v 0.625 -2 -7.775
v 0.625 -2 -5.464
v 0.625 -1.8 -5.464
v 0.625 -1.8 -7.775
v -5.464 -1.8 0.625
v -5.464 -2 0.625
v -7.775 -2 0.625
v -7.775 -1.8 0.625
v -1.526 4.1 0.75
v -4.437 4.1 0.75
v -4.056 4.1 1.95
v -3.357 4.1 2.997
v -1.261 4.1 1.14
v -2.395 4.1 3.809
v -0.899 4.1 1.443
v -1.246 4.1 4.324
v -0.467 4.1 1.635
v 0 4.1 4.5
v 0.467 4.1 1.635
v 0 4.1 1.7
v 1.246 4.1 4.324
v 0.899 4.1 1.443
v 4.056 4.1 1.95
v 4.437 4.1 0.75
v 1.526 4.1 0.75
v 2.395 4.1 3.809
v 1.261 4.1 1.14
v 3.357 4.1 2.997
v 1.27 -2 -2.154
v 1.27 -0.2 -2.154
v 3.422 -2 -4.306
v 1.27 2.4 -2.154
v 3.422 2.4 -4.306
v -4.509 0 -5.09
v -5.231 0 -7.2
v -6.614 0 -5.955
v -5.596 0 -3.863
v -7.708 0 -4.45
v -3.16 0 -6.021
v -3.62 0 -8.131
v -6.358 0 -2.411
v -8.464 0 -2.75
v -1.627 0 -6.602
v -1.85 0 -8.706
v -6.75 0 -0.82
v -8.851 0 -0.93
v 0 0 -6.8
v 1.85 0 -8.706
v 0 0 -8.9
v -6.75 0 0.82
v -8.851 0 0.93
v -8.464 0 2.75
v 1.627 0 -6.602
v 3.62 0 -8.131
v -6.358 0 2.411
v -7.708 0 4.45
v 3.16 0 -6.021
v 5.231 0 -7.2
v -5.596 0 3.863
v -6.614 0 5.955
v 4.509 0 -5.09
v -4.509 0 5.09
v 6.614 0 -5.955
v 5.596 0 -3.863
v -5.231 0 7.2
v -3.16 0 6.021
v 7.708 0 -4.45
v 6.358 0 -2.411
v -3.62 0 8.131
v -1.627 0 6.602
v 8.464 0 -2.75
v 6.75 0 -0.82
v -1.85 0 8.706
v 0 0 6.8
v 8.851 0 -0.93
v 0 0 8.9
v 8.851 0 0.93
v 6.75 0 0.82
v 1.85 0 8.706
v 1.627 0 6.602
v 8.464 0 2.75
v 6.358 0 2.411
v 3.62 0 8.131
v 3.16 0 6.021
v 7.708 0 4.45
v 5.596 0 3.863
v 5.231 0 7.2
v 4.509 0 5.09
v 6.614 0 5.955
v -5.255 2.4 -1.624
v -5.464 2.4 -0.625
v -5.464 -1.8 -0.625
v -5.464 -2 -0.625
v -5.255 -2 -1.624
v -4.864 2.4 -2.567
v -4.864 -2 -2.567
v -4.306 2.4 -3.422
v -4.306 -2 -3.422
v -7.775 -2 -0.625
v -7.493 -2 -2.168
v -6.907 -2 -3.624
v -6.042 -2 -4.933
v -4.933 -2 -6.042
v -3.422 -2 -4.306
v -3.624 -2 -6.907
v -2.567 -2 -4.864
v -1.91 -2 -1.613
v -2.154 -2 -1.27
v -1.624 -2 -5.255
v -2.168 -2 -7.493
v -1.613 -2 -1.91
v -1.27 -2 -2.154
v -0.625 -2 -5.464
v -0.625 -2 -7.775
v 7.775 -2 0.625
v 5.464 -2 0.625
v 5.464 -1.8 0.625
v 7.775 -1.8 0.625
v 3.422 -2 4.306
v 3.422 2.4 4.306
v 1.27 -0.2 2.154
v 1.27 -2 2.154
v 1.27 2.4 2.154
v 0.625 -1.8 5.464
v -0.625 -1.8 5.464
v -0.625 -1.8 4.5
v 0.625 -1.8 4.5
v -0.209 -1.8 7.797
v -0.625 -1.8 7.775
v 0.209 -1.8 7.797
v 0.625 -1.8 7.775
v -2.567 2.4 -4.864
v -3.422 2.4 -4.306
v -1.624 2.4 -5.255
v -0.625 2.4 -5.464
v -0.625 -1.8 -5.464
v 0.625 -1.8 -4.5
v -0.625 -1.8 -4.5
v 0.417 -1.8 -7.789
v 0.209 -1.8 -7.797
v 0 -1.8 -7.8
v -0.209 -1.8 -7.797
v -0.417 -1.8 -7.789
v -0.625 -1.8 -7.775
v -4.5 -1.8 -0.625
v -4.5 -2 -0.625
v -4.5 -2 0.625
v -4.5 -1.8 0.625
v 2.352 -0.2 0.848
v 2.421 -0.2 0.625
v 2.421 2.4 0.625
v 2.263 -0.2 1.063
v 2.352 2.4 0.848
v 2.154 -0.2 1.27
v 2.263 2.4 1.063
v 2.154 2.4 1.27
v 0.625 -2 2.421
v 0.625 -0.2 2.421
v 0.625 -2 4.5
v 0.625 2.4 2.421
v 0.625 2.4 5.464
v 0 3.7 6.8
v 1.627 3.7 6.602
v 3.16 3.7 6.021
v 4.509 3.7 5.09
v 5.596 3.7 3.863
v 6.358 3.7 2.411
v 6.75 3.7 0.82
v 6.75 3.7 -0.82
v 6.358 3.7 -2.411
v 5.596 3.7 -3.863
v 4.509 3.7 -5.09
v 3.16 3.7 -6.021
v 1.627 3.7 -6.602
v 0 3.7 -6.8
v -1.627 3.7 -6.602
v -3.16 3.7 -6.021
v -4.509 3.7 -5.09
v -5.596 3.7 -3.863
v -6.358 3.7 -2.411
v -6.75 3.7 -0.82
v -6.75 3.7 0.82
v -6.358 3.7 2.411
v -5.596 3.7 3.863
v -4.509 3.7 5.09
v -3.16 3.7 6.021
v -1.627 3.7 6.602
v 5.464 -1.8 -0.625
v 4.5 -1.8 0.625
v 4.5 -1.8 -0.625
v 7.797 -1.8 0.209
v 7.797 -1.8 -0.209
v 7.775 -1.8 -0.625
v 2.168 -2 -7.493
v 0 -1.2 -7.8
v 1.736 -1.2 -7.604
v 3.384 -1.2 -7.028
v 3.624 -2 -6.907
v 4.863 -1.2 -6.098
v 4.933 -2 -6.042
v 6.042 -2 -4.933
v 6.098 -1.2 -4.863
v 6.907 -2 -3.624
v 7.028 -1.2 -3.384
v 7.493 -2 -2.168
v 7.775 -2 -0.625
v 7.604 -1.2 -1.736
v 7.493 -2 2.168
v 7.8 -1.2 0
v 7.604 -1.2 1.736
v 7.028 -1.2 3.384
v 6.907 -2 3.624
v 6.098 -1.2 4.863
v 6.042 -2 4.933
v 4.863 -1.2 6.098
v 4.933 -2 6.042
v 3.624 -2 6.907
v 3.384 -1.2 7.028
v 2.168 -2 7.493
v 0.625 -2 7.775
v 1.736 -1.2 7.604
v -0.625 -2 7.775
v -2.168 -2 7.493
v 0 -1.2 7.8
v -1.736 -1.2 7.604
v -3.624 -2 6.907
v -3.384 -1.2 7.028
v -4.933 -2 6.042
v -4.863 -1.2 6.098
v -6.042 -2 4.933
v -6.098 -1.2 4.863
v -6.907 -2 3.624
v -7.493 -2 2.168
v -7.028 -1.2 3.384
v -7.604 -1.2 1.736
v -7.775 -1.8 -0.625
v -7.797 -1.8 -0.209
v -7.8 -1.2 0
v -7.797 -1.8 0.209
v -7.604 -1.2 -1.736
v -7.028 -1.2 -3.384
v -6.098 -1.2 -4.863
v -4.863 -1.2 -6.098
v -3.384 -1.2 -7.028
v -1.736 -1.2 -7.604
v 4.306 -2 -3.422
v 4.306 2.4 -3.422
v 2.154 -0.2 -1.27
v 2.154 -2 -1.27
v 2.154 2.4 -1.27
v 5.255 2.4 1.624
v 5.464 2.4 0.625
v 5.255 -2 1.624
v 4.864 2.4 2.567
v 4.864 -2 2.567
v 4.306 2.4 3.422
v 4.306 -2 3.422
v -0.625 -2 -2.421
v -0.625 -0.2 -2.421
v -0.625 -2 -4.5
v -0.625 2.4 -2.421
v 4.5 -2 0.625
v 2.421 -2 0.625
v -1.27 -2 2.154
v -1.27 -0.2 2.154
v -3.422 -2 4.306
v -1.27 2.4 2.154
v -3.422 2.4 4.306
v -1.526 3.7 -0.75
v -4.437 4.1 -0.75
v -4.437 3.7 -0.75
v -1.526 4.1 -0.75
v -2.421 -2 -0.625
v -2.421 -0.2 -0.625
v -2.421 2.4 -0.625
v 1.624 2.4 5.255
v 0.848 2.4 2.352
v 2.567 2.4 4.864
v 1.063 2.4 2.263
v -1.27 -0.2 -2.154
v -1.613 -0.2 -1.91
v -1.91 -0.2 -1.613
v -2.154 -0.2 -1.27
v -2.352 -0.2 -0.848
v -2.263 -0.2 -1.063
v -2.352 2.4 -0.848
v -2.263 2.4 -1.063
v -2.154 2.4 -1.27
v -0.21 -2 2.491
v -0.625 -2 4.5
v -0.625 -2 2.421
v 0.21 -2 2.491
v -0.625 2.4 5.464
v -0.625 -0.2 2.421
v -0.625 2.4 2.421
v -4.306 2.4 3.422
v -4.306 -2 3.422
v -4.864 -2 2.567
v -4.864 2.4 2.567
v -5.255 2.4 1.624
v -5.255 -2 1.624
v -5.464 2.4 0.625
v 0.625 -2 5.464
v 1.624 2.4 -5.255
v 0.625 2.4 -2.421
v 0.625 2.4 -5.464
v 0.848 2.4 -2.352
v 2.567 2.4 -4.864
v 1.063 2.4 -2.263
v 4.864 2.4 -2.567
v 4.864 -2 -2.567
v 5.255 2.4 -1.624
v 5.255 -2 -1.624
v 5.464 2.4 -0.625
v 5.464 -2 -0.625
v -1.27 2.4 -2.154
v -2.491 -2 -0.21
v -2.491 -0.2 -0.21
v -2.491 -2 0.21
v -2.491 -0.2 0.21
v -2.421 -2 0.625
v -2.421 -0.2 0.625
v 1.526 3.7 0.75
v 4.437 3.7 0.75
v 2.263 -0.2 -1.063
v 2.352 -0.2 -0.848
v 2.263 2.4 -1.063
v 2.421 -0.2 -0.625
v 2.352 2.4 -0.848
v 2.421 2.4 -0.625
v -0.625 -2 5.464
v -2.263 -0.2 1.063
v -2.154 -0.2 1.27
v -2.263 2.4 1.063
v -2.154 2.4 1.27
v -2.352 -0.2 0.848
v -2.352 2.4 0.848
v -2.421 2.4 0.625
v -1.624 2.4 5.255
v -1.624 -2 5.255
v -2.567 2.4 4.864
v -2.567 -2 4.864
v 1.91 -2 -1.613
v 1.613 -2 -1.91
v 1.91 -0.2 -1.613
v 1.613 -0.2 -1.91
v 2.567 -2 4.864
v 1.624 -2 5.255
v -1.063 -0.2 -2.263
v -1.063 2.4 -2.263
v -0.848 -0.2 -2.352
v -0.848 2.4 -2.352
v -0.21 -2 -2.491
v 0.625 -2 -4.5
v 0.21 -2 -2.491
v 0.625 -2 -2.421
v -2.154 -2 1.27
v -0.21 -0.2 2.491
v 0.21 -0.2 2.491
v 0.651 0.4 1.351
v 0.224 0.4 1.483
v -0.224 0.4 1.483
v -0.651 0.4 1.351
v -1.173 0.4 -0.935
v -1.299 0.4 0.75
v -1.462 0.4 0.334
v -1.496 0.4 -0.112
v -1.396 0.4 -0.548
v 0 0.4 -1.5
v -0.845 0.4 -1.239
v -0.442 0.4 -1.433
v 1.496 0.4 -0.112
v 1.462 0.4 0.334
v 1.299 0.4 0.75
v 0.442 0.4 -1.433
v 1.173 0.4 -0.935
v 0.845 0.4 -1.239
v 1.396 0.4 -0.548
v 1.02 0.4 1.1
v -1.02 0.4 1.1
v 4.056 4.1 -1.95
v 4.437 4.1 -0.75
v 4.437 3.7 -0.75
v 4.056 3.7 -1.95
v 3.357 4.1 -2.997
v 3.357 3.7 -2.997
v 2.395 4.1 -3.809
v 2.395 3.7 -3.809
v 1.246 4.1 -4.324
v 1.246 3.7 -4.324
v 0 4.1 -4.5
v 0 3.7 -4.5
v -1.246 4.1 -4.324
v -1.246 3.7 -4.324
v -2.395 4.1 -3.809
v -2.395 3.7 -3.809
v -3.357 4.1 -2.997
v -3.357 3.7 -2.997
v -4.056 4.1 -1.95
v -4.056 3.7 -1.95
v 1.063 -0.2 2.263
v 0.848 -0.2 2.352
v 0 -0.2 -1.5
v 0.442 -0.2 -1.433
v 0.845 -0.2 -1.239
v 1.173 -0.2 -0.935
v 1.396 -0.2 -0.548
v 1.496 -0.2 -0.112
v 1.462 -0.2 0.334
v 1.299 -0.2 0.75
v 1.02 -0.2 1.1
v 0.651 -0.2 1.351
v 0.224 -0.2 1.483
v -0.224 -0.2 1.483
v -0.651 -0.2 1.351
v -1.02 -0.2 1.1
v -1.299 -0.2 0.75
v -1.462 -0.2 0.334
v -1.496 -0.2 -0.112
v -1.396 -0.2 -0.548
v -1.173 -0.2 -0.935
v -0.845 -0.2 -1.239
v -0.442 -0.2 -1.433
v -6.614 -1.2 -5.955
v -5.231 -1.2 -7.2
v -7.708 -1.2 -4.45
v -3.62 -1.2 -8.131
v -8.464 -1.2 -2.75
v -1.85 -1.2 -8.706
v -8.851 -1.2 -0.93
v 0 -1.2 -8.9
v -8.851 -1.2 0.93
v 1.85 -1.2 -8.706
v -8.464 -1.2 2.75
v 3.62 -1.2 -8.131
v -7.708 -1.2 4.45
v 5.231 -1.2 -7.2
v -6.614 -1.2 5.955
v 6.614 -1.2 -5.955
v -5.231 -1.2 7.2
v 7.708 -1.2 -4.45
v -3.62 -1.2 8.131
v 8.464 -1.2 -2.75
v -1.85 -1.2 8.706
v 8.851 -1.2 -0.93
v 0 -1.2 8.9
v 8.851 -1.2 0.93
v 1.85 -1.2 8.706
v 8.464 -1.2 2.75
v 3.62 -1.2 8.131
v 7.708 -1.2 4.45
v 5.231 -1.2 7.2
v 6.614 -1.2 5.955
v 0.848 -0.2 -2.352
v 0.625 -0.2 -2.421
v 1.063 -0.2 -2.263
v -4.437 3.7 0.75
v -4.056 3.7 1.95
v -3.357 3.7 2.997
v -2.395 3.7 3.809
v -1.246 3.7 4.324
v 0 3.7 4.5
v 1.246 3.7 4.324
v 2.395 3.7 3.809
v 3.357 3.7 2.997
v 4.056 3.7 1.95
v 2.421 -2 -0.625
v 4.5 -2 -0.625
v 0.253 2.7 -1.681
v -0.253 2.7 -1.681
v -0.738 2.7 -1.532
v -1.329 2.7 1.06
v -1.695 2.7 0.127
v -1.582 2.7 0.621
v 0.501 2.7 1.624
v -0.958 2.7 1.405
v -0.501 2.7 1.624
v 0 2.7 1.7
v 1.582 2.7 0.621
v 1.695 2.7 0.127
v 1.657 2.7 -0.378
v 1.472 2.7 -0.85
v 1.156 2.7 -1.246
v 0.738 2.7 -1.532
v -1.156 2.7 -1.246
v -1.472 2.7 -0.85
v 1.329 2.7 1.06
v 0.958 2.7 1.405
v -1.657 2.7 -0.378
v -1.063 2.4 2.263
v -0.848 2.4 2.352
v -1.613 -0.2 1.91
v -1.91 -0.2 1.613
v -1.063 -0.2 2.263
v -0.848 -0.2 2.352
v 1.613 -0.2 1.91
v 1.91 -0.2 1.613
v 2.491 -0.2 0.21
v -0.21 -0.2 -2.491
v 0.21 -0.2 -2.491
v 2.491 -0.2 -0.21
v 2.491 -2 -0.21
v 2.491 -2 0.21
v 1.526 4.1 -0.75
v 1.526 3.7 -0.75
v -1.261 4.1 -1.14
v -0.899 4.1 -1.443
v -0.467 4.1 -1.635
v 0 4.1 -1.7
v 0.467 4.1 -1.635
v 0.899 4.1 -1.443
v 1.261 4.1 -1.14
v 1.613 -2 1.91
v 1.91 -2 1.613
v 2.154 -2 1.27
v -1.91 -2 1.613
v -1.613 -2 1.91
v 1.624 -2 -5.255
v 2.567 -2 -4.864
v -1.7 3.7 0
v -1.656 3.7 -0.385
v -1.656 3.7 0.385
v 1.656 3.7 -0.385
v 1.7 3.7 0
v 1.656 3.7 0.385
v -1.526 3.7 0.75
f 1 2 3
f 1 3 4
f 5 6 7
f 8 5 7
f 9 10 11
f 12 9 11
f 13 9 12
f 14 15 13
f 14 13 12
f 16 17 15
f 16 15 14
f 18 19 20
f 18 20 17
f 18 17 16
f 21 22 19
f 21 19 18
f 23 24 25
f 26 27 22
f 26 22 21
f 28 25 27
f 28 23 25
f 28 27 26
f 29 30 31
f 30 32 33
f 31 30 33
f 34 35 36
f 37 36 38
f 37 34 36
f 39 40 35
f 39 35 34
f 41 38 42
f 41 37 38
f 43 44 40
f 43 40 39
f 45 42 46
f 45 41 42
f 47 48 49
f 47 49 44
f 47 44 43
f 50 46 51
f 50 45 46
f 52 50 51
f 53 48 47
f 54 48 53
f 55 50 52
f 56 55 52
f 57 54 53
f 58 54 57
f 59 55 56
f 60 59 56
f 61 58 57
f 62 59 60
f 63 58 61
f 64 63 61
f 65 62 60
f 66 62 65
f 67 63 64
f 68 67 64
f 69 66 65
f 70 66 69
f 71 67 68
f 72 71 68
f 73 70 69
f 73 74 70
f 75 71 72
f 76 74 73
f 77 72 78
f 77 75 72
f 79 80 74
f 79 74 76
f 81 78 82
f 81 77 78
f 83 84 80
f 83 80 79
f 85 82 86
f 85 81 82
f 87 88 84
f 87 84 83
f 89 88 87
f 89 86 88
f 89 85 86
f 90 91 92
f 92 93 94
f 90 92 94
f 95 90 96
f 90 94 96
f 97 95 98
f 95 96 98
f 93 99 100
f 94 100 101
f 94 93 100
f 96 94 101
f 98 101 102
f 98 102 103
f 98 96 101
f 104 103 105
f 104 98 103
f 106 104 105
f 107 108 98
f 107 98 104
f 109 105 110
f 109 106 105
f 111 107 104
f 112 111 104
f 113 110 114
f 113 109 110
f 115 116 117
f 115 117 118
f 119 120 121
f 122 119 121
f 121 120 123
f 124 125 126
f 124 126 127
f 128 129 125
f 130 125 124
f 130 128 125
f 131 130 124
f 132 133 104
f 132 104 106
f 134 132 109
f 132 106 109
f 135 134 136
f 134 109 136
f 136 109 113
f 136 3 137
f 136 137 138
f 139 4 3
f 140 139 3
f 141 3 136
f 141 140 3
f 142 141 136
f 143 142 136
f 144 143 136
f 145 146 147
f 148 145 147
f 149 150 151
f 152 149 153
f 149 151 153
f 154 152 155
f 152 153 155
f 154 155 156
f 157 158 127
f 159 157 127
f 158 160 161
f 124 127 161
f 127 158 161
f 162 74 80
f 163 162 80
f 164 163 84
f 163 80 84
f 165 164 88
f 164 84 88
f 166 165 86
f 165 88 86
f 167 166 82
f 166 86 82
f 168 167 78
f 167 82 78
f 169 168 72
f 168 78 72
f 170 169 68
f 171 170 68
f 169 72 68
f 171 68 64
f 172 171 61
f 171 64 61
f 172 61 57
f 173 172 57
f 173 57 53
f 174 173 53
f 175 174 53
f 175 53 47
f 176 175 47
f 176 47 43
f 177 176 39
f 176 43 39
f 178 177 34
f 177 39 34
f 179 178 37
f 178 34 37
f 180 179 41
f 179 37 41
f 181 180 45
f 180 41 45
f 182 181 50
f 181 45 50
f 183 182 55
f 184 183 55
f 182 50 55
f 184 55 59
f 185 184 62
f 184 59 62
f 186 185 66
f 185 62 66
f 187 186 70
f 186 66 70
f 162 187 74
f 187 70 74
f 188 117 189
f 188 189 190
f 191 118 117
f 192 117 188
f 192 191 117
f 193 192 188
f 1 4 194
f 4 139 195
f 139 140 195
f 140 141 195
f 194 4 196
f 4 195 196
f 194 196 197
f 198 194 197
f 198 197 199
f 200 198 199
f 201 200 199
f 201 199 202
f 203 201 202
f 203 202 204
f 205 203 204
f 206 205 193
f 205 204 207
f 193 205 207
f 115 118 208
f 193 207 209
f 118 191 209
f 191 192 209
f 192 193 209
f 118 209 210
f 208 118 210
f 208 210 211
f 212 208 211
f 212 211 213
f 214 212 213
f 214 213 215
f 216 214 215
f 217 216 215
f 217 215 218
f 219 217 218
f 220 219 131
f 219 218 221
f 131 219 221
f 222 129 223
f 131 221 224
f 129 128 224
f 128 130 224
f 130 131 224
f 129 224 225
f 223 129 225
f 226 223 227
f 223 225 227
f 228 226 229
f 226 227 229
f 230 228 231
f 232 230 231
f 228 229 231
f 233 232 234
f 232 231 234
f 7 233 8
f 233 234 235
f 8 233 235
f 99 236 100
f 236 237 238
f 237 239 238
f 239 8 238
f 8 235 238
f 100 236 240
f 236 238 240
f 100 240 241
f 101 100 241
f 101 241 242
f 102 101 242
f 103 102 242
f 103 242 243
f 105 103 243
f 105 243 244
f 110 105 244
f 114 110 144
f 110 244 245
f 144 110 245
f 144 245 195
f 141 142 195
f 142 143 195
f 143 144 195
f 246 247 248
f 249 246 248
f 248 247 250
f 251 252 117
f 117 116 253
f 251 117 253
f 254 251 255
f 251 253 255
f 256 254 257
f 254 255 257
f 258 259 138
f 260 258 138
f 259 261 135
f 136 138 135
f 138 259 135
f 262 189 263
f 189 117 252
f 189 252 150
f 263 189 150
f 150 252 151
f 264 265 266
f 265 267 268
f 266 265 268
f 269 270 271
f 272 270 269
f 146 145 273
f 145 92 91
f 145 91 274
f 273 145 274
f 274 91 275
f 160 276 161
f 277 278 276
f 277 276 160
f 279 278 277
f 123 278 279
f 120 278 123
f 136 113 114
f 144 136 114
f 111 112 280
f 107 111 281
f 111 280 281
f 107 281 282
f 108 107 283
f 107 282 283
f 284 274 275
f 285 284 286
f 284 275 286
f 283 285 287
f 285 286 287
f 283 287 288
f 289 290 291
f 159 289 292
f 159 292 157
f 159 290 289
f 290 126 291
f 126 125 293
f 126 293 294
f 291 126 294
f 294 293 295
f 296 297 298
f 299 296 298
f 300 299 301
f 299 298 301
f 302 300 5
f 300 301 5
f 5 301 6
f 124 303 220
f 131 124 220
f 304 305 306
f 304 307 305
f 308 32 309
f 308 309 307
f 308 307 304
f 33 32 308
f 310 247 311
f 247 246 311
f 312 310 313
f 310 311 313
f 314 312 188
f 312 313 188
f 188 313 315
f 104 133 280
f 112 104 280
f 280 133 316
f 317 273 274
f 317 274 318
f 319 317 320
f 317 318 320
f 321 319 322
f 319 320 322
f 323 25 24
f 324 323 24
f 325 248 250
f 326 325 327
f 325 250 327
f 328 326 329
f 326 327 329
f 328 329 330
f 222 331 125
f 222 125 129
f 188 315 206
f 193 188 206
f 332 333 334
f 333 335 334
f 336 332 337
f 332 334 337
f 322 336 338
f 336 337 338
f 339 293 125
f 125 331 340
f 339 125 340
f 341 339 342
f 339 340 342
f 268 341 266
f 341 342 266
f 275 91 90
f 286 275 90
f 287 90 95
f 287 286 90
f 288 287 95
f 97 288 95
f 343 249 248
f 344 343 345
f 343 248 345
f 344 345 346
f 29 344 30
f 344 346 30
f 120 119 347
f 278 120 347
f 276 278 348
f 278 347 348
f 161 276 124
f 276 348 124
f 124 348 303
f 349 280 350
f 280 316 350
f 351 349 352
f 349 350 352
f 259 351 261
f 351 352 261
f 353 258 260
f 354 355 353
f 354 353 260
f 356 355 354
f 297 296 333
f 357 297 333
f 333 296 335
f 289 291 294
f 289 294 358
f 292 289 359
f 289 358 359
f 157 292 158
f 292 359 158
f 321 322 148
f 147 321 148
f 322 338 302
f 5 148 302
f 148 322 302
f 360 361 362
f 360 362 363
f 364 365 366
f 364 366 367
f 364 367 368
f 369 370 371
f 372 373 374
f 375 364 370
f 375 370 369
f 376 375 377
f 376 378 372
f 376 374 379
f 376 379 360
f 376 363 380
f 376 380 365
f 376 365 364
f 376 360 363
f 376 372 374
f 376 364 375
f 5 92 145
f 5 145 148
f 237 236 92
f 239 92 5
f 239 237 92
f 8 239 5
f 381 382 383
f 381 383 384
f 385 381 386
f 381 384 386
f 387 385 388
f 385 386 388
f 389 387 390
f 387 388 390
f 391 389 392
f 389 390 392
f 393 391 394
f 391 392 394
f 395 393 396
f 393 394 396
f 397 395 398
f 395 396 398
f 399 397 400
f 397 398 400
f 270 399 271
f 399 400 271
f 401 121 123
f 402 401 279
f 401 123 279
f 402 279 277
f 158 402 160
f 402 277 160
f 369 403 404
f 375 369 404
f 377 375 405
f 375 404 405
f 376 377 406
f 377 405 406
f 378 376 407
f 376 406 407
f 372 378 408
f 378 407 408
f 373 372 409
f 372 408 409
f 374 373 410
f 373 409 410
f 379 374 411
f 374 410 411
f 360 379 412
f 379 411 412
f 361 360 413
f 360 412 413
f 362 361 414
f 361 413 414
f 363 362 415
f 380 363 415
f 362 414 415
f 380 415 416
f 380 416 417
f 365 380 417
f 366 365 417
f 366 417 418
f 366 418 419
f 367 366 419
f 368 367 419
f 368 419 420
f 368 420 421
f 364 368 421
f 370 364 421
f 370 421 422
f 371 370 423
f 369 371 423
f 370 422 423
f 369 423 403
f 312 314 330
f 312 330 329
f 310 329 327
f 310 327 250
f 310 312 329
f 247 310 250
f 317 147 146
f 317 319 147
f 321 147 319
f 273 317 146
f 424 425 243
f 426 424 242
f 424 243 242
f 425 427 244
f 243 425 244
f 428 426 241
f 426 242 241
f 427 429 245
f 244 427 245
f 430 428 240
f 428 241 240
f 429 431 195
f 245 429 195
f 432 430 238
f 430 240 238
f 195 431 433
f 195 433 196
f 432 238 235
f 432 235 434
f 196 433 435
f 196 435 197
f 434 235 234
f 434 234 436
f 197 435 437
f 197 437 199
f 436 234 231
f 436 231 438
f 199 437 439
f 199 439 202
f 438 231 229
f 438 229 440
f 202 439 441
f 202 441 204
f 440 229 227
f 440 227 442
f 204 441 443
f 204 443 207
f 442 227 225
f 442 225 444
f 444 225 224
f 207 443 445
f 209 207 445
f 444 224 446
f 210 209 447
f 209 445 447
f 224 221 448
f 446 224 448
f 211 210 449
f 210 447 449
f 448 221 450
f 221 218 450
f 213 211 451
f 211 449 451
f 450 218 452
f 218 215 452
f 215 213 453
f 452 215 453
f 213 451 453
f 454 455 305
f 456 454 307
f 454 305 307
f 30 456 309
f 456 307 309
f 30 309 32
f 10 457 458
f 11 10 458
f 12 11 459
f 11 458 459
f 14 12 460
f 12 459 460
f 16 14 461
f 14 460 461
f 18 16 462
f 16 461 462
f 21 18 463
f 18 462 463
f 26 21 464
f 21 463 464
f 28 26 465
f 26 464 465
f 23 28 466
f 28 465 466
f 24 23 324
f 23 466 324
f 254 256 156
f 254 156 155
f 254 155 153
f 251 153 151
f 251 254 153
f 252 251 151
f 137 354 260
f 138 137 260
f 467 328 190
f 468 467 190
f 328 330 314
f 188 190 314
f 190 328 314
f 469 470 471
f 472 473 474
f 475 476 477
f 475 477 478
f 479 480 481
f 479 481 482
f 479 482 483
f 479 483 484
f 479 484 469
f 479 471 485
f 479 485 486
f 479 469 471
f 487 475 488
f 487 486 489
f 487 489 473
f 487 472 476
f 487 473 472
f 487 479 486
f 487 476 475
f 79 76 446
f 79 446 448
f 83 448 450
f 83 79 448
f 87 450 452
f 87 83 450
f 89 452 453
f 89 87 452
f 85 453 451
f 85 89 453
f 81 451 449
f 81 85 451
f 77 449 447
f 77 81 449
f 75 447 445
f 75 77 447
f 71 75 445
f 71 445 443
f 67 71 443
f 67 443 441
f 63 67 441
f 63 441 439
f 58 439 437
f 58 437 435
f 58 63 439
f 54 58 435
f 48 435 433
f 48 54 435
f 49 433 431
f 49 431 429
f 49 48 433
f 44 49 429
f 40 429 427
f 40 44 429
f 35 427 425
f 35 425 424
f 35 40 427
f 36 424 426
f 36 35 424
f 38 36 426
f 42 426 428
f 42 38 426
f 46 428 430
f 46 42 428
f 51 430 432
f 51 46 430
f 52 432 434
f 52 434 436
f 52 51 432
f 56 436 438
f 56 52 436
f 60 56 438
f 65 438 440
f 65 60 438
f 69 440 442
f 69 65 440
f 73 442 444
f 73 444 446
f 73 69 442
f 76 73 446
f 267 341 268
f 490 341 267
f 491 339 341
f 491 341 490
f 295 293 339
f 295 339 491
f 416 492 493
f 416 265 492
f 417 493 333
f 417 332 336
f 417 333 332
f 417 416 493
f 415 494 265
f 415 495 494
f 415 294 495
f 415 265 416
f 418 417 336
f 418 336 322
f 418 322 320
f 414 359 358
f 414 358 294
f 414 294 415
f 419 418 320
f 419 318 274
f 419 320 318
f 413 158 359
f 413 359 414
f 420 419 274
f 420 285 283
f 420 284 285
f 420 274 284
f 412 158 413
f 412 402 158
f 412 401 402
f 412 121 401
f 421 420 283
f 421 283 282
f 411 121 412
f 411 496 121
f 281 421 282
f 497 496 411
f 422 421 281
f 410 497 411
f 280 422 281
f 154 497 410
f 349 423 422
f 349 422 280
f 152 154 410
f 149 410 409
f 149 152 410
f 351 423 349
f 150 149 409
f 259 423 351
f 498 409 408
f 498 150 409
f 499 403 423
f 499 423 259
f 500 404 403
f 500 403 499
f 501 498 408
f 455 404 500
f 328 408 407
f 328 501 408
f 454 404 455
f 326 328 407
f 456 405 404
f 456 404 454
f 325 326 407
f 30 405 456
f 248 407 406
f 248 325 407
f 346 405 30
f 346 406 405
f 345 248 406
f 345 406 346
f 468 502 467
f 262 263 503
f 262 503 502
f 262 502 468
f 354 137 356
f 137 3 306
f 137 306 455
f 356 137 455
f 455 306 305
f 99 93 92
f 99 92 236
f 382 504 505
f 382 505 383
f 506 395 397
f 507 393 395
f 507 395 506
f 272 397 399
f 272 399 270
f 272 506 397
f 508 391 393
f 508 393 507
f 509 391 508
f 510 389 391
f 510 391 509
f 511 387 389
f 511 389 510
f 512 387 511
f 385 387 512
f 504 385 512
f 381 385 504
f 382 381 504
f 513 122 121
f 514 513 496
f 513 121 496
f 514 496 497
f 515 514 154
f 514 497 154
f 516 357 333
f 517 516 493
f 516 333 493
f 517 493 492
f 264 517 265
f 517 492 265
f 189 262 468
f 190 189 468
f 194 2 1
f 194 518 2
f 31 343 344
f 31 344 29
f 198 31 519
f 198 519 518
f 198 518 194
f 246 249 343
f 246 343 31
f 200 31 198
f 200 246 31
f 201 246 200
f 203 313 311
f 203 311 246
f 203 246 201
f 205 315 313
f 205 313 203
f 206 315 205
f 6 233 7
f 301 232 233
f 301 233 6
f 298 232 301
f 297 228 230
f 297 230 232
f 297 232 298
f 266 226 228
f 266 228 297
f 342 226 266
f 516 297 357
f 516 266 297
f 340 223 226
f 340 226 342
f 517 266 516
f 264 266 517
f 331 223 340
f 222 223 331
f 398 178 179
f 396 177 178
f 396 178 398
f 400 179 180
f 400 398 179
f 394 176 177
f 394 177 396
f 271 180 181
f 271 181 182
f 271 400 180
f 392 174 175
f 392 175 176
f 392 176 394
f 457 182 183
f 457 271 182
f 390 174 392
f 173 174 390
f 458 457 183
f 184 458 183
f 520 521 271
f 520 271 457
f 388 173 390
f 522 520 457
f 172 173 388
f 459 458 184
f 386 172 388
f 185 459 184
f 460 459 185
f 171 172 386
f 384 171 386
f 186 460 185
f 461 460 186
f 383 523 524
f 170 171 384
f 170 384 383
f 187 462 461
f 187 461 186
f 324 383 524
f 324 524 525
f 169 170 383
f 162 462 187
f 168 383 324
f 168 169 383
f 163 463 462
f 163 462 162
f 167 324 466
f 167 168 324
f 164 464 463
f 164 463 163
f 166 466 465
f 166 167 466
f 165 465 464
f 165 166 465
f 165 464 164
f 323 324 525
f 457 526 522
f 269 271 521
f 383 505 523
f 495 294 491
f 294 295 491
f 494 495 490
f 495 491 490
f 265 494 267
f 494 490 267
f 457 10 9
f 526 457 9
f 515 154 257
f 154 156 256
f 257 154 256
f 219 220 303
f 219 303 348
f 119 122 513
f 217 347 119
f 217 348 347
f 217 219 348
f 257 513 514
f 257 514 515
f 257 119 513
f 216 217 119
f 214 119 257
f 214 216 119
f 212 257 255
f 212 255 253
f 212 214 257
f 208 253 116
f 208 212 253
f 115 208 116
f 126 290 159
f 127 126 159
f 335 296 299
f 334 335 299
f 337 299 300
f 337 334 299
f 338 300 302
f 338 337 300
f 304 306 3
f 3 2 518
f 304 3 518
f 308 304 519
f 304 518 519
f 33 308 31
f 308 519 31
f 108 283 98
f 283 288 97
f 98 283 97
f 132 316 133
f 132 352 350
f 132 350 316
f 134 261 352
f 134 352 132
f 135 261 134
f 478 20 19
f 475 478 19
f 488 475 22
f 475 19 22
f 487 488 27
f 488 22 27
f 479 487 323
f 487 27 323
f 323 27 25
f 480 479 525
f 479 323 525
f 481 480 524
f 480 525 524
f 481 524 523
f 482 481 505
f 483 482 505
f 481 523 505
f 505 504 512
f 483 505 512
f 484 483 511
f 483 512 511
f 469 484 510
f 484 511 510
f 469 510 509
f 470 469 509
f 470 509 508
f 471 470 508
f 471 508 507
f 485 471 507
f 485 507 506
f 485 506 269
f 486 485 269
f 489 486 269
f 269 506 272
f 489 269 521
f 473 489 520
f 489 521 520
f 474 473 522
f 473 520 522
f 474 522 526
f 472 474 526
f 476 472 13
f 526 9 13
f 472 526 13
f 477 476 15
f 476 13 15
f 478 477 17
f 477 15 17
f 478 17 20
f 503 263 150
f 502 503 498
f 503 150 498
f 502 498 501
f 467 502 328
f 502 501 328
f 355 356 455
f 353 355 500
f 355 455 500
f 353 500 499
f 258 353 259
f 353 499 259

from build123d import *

# Parameters (mm, degrees)
BASES_R               = 8.9
BASE_DEPTH            = 1.2
O_RINGCAPTURES_R      = 6.8
O_RINGCAPTURE_DEPTH   = 3.7
SEALINGFACES_R        = 4.5
SEALINGFACE_DEPTH     = 0.4
SLOTCUTS_W            = 9
SLOTCUTS_H            = 1.5
SLOTCUT_DEPTH         = 0.4
BOTTOMBASES_R         = 7.8
BOTTOMBASE_DEPTH      = 0.8
TOPBORES_R            = 1.7
TOPBORE_DEPTH         = 1.4
BOTTOMBORES_R         = 5.5
BOTTOMBORE_DEPTH      = 4.4
CENTRALCYLINDERS_R    = 2.5
CENTRALCYLINDER_DEPTH = 2.6
CYLINDERBORES_R       = 1.5
CYLINDERBORE_DEPTH    = 0.6
RIB_REACH             = 15.333
RIBCP_COUNT           = 8
RIBCUTS_W             = 1.25
RIBCUTS_H             = 3.3
RIBCUT_DEPTH          = 0.2
RIBCUTCP_COUNT        = 4


with BuildPart() as part:
    # BaseS → Base (new body)
    with BuildSketch(Plane(origin=(0, 0, 0), x_dir=(1, 0, 0), z_dir=(0, 1, 0))):
        with Locations(Location((0, 0, 0), (0, 0, 270))):
            Circle(BASES_R)
    extrude(amount=-BASE_DEPTH)

    # O-RingCaptureS → O-RingCapture (add)
    with BuildSketch(Plane(origin=(0, 0, 0), x_dir=(1, 0, 0), z_dir=(0, 1, 0))):
        with Locations(Location((0, 0, 0), (0, 0, 270))):
            Circle(O_RINGCAPTURES_R)
    extrude(amount=O_RINGCAPTURE_DEPTH)

    # SealingFaceS → SealingFace (add)
    with BuildSketch(Plane(origin=(0, 3.7, 0), x_dir=(1, 0, 0), z_dir=(0, 1, 0))):
        with Locations(Location((0, 0, 0), (0, 0, 270))):
            Circle(SEALINGFACES_R)
    extrude(amount=SEALINGFACE_DEPTH)

    # SlotCutS → SlotCut (cut)
    with BuildSketch(Plane(origin=(0, 4.1, 0), x_dir=(1, 0, 0), z_dir=(0, 1, 0))):
        Rectangle(SLOTCUTS_W, SLOTCUTS_H)
    extrude(amount=-SLOTCUT_DEPTH, mode=Mode.SUBTRACT)

    # BottomBaseS → BottomBase (add)
    with BuildSketch(Plane.XZ.offset(1.2)):
        with Locations(Location((0, 0, 0), (0, 0, 270))):
            Circle(BOTTOMBASES_R)
    extrude(amount=BOTTOMBASE_DEPTH)

    # TopBoreS → TopBore (cut)
    with BuildSketch(Plane(origin=(0, 4.1, 0), x_dir=(1, 0, 0), z_dir=(0, 1, 0))):
        with Locations(Location((0, 0, 0), (0, 0, 270))):
            Circle(TOPBORES_R)
    extrude(amount=-TOPBORE_DEPTH, mode=Mode.SUBTRACT)

    # BottomBoreS → BottomBore (cut)
    with BuildSketch(Plane.XZ.offset(2)):
        with Locations(Location((0, 0, 0), (0, 0, 270))):
            Circle(BOTTOMBORES_R)
    extrude(amount=-BOTTOMBORE_DEPTH, mode=Mode.SUBTRACT)

    # CentralCylinderS → CentralCylinder (add)
    with BuildSketch(Plane(origin=(0, 2.4, 0), x_dir=(-1, 0, 0), z_dir=(0, -1, 0))):
        with Locations(Location((0, 0, 0), (0, 0, 90))):
            Circle(CENTRALCYLINDERS_R)
    extrude(amount=CENTRALCYLINDER_DEPTH)

    # CylinderBoreS → CylinderBore (cut)
    with BuildSketch(Plane(origin=(0, -0.2, 0), x_dir=(-1, 0, 0), z_dir=(0, -1, 0))):
        with Locations(Location((0, 0, 0), (0, 0, 90))):
            Circle(CYLINDERBORES_R)
    extrude(amount=-CYLINDERBORE_DEPTH, mode=Mode.SUBTRACT)

    # Rib: up to this face of the body (flat: up to its plane)
    rib_end = Plane(part.part.faces().sort_by_distance((0, -2, 7.579382684))[0])
    # RibS → Rib (add, up to the picked face)
    with BuildSketch(Plane(origin=(0, 2.4, 0), x_dir=(-1, 0, 0), z_dir=(0, -1, 0)), mode=Mode.PRIVATE) as rib_sk1:
        with BuildLine():
            Line((0.625, -5.464373249), (0.625, -2.420614591))
            ThreePointArc((0.625, -2.420614591), (0, -2.5), (-0.625, -2.420614591))
            Line((-0.625, -2.420614591), (-0.625, -5.464373249))
            ThreePointArc((-0.625, -5.464373249), (0, -5.5), (0.625, -5.464373249))
        make_face()
    rib_tool1 = split(extrude(rib_sk1.sketch, amount=RIB_REACH, mode=Mode.PRIVATE), bisect_by=rib_end, keep=Keep.BOTH, mode=Mode.PRIVATE)
    rib = rib_tool1.solids().sort_by(Axis((0, 2.4, 3.98085), (0, -1, 0)))[0]
    add(rib)

    # RibCP: Rib ×8 about axis
    ribcp_axis = Axis((0, 0, 0), (0, 1, 0))
    for i in range(1, RIBCP_COUNT):
        add(rib.rotate(ribcp_axis, i * 360 / RIBCP_COUNT))

    # RibCutS → RibCut (cut)
    with BuildSketch(Plane.XZ.offset(2)):
        with Locations((0, 6.15)):
            Rectangle(RIBCUTS_W, RIBCUTS_H)
    ribcut = extrude(amount=-RIBCUT_DEPTH, mode=Mode.SUBTRACT)

    # RibCutCP: RibCut ×4 about axis
    ribcutcp_axis = Axis((0, 0, 0), (0, 1, 0))
    for i in range(1, RIBCUTCP_COUNT):
        add(ribcut.rotate(ribcutcp_axis, i * 360 / RIBCUTCP_COUNT), mode=Mode.SUBTRACT)


solid = part.part
